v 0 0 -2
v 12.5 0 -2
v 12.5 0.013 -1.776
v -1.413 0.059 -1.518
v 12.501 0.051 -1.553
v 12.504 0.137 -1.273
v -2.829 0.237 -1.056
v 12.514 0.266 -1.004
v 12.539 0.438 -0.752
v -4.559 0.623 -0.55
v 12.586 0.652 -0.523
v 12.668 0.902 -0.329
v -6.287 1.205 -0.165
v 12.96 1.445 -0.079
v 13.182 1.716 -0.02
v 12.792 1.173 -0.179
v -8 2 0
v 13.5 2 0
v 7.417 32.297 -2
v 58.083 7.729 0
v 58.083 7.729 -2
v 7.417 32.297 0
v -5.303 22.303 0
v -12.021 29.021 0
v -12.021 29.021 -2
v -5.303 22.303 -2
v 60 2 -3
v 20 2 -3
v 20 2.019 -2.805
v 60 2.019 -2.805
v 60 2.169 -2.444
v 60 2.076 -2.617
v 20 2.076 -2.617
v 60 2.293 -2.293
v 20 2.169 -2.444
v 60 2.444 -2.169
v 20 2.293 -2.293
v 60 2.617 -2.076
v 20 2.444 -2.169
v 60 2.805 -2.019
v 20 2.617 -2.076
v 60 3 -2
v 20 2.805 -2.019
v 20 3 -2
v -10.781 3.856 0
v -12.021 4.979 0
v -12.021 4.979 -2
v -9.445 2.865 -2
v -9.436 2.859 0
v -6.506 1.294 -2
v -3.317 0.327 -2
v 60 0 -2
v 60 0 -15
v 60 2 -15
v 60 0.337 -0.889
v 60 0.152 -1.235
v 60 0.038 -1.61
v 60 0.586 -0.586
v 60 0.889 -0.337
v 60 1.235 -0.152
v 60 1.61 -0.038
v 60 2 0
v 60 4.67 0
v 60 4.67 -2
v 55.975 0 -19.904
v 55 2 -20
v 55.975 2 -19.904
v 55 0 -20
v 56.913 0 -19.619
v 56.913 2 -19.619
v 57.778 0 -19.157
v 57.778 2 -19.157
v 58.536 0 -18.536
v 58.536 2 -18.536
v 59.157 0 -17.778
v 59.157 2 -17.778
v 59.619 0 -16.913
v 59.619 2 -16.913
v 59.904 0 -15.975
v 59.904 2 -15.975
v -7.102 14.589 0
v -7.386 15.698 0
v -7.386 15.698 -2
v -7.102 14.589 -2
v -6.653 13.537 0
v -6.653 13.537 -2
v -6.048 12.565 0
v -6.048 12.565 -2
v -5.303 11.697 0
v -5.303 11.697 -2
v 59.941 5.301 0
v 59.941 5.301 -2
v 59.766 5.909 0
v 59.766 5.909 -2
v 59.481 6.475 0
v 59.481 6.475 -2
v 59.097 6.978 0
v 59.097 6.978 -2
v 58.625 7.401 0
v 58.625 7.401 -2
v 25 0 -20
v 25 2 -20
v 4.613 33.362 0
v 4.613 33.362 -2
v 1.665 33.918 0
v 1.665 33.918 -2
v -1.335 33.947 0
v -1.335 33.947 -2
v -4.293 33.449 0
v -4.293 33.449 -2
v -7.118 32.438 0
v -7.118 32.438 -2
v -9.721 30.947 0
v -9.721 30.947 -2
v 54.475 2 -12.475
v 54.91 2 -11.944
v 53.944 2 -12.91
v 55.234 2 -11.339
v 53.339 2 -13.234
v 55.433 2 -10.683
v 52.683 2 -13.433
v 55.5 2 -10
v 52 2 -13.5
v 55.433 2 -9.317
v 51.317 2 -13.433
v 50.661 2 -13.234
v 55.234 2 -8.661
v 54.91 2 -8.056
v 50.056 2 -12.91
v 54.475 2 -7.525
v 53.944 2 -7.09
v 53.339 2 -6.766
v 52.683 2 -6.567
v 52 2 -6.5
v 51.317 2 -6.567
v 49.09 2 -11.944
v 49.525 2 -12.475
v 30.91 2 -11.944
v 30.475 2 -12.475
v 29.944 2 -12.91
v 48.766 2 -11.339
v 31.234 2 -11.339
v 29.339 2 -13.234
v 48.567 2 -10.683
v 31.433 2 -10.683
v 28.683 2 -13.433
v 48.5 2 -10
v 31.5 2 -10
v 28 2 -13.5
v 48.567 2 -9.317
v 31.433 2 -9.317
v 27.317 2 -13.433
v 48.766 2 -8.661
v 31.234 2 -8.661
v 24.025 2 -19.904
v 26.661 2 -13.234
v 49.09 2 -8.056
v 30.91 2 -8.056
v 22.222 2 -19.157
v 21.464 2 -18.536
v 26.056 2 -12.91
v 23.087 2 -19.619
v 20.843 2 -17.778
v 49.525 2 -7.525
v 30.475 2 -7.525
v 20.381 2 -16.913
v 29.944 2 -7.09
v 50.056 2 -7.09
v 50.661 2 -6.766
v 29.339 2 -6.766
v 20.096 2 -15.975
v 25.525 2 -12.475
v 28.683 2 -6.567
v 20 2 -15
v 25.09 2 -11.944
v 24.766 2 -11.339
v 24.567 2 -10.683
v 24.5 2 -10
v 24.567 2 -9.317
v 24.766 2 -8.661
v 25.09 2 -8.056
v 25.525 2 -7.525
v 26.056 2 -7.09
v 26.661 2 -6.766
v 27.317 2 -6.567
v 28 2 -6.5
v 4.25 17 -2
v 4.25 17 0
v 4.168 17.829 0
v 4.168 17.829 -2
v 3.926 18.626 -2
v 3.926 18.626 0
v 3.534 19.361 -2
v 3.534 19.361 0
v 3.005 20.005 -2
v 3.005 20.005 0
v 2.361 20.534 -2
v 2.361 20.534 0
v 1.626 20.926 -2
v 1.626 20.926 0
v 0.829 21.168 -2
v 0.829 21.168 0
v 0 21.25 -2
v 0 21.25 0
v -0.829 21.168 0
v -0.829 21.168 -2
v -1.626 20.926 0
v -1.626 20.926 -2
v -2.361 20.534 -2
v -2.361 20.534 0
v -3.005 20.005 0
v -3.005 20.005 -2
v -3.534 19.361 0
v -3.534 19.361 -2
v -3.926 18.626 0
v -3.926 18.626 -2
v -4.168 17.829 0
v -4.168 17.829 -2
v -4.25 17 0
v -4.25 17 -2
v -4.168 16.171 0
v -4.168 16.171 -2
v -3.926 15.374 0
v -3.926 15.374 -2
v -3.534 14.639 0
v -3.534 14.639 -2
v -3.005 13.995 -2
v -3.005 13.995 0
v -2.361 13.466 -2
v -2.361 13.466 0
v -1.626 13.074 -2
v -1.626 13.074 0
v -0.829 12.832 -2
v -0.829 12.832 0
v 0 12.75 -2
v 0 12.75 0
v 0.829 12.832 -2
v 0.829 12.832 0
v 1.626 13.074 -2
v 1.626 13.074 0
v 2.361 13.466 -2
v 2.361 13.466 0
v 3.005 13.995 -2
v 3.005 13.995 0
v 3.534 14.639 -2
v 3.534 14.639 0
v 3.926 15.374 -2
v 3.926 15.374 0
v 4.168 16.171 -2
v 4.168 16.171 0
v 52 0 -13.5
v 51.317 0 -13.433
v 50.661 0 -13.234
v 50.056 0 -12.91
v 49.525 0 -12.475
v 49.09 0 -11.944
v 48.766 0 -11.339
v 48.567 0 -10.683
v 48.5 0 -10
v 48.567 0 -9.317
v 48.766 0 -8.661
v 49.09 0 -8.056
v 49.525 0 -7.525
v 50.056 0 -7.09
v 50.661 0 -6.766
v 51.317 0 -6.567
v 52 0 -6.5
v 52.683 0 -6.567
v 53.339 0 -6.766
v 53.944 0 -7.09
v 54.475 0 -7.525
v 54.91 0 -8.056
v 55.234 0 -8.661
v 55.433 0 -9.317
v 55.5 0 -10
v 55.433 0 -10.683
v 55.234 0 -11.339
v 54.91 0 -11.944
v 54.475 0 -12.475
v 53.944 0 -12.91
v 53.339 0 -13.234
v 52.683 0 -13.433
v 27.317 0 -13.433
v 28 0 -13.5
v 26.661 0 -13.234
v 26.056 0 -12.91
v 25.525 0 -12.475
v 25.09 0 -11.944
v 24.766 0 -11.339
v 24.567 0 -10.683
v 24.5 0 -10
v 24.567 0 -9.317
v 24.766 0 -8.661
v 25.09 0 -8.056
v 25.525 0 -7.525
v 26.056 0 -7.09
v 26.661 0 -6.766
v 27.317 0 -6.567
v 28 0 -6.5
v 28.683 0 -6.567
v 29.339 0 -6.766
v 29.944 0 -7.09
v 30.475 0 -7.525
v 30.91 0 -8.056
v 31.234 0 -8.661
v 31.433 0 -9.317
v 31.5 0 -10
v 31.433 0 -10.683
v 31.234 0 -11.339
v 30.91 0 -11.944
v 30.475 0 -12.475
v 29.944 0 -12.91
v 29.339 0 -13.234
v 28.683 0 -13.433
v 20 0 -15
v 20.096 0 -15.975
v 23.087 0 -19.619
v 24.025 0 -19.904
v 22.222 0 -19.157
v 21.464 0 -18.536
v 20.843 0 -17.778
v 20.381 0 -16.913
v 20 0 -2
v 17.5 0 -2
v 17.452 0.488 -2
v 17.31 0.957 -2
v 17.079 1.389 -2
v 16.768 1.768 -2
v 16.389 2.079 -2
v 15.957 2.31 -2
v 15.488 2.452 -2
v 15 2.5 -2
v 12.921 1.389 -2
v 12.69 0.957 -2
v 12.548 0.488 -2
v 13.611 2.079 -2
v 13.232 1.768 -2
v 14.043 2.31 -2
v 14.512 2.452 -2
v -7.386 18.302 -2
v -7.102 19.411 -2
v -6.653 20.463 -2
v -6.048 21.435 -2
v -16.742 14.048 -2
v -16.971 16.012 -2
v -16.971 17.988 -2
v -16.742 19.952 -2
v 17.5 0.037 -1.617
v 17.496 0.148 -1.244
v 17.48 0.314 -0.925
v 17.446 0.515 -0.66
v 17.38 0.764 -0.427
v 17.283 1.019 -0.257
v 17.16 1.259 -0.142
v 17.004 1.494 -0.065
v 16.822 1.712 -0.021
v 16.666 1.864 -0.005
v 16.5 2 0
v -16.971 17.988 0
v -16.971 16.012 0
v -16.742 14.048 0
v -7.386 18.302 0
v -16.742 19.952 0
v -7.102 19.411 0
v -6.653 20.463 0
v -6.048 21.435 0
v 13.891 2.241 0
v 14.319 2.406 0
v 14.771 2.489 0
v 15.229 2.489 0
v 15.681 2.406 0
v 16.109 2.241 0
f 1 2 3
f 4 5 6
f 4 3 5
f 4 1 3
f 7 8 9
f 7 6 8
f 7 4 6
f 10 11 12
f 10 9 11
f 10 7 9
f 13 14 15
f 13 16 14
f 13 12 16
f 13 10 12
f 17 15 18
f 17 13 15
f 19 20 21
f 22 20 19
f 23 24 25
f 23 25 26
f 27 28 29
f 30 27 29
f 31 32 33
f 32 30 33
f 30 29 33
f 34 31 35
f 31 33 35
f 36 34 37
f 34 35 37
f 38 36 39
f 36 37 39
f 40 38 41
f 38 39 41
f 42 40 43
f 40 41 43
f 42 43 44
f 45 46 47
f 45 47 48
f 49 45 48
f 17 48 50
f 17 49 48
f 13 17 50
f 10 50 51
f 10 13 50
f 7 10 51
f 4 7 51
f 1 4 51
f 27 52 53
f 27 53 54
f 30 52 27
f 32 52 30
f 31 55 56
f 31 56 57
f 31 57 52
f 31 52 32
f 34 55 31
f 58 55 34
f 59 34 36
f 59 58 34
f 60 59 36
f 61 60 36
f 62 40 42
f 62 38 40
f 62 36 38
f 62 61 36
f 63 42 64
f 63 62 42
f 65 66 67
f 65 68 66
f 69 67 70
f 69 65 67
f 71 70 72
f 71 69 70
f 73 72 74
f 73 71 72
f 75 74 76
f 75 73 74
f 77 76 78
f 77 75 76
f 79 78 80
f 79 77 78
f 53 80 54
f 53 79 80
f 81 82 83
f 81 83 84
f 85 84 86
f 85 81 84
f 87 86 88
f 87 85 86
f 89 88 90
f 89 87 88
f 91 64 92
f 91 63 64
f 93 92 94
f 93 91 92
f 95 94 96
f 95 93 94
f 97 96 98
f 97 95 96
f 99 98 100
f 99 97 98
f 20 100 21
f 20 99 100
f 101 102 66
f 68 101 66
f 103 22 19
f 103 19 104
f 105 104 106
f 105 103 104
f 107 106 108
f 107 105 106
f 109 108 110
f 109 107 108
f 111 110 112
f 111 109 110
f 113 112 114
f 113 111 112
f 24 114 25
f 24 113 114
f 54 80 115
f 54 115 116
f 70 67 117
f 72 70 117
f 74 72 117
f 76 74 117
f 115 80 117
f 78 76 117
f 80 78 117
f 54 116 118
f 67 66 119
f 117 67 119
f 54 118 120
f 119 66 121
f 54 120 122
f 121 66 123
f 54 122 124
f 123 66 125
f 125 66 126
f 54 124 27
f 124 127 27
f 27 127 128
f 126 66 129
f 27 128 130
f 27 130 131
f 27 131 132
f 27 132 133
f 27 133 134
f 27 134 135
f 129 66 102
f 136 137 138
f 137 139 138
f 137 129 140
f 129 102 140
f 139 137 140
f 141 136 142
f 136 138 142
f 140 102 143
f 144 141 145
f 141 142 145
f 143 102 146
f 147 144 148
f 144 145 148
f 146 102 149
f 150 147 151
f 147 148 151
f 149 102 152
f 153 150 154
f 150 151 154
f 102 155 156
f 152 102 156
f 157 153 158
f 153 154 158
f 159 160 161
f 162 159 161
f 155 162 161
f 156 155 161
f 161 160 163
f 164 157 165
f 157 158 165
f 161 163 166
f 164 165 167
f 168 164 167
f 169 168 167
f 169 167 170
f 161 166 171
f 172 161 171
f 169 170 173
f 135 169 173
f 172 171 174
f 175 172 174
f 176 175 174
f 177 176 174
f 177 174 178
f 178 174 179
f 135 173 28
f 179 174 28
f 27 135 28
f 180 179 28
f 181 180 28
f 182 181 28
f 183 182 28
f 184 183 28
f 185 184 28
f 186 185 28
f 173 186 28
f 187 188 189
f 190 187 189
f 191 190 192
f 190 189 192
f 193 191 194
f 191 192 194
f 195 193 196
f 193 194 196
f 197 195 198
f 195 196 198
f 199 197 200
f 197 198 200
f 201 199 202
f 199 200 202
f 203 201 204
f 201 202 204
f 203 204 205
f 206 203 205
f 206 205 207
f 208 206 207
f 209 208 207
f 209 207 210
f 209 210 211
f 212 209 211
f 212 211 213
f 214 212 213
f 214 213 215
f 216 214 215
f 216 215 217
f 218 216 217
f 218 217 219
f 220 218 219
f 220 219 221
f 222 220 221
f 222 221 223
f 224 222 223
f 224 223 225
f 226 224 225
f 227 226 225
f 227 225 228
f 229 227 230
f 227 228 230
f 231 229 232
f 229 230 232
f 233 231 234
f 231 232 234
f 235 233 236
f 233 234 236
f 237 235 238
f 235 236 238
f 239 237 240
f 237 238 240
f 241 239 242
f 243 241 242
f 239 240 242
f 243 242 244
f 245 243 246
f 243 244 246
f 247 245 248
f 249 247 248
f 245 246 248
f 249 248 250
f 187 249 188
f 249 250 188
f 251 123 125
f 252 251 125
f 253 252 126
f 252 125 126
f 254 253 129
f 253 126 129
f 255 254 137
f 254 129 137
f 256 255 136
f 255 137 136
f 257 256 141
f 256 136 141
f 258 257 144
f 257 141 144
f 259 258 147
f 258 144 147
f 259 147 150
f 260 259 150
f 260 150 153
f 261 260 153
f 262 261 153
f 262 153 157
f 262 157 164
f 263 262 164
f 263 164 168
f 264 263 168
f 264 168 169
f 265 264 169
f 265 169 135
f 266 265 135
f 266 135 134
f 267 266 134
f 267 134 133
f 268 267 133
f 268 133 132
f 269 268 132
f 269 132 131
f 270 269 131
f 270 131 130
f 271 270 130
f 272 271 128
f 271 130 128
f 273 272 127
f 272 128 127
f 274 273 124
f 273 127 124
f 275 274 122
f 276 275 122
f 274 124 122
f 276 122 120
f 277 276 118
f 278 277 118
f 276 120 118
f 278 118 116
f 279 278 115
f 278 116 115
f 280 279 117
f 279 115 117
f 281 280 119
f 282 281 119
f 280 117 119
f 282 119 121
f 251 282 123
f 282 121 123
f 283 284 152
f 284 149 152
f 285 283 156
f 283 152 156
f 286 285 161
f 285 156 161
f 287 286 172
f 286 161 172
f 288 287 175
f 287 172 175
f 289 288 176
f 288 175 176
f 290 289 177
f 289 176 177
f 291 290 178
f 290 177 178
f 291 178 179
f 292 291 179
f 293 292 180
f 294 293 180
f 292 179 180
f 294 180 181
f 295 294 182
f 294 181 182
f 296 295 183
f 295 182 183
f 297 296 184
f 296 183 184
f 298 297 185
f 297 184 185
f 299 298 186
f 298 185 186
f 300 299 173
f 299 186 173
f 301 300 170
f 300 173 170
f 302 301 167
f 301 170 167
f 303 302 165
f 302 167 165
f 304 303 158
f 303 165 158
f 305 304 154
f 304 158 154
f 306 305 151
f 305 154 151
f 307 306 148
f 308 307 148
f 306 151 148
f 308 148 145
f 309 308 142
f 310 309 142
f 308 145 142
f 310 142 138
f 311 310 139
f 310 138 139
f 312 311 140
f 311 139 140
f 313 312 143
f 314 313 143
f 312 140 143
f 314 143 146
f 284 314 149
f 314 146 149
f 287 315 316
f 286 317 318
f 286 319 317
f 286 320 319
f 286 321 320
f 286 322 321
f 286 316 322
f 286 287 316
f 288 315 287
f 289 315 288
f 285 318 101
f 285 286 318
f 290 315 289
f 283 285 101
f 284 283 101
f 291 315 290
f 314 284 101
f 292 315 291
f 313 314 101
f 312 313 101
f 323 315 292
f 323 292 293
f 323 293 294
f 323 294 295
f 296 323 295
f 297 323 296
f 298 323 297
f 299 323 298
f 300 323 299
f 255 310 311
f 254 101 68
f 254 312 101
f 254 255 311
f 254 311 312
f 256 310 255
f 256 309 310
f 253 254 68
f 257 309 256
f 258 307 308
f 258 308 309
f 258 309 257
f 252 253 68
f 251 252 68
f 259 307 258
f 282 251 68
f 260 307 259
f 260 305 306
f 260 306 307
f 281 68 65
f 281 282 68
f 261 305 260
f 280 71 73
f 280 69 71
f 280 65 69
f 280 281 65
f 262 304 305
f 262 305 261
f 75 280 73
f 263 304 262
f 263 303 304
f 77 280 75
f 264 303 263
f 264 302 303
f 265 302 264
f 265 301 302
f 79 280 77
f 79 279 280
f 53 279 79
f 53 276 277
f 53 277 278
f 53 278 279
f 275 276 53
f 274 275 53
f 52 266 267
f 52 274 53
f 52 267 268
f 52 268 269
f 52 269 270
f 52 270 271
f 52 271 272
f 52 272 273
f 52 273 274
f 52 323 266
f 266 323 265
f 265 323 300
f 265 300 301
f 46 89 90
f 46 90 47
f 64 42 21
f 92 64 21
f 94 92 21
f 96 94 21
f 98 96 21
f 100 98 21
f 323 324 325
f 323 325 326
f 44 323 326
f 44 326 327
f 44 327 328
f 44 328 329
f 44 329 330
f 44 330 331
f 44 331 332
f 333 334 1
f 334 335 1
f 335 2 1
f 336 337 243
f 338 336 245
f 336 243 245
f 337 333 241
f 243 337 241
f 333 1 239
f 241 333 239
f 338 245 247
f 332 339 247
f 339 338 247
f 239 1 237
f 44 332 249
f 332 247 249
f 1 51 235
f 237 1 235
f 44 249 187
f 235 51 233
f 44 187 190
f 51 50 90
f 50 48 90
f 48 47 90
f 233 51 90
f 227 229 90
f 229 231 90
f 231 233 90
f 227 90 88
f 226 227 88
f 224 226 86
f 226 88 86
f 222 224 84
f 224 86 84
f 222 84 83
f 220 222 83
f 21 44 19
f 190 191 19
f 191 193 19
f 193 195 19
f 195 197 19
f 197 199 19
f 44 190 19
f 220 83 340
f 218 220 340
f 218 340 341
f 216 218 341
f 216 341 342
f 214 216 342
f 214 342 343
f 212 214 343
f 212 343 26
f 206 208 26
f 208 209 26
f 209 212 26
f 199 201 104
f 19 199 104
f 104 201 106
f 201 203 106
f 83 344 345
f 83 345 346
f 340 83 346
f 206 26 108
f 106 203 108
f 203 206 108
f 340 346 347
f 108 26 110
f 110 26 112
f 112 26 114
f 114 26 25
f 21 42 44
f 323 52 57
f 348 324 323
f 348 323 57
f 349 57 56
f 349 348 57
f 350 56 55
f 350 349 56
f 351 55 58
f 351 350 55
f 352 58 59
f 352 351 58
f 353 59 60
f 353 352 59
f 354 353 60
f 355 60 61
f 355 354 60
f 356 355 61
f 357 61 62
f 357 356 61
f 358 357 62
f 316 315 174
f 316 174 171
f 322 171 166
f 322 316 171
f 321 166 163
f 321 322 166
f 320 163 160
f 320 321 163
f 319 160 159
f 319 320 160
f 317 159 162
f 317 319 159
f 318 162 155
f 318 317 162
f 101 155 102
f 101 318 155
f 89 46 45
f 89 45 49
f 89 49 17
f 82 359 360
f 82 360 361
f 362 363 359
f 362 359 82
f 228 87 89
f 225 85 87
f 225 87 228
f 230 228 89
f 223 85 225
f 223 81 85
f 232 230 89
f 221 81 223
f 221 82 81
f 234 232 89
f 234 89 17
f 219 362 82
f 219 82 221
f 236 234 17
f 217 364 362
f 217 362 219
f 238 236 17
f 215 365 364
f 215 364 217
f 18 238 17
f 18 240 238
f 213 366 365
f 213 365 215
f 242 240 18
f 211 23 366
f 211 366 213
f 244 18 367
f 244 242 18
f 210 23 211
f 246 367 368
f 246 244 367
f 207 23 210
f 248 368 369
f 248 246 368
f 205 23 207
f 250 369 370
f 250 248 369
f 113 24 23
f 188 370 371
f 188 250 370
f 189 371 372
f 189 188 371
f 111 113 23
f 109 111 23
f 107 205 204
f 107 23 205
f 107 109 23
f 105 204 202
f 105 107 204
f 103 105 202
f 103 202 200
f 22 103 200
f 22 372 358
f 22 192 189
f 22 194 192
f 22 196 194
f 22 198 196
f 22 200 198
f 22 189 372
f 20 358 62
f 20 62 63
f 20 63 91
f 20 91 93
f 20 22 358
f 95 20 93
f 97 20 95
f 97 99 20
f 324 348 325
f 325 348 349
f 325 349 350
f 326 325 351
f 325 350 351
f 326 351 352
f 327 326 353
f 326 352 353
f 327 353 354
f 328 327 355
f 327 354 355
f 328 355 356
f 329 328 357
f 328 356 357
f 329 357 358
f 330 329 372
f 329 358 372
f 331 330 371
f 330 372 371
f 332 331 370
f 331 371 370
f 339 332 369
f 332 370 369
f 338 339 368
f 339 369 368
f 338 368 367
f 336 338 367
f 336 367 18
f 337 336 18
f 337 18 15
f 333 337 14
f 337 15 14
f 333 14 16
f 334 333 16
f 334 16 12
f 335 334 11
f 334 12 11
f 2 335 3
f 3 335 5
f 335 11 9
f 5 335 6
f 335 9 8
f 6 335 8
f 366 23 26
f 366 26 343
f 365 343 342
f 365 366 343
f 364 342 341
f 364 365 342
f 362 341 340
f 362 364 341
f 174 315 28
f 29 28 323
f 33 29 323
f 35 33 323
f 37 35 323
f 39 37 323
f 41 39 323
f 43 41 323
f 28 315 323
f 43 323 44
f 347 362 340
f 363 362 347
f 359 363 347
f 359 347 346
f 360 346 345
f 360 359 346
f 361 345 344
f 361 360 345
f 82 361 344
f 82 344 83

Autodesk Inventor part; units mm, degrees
sketch "Sketch_1" plane through (0, 0, 0) normal (0, 0, 1) x (1, 0, 0)
  arc A0 (-16.7417, 19.952) -> (-16.7417, 14.048) centre (0, 17) ccw
  line L0 (-16.7417, 14.048) -> (-7.3861, 15.6976)
  arc A1 (-7.3861, 15.6976) -> (-5.3033, 11.6967) centre (0, 17) ccw
  line L1 (-5.3033, 11.6967) -> (-12.0208, 4.9792)
  arc A2 (-12.0208, 4.9792) -> (0, 0) centre (0, 17) ccw
  line L2 (0, 0) -> (60, 0)
  line L3 (60, 0) -> (60, 4.67)
  arc A3 (60, 4.67) -> (58.0834, 7.7293) centre (56.6, 4.67) ccw
  line L4 (58.0834, 7.7293) -> (7.4171, 32.2966)
  arc A4 (7.4171, 32.2966) -> (-12.0208, 29.0208) centre (0, 17) ccw
  line L5 (-12.0208, 29.0208) -> (-5.3033, 22.3033)
  arc A5 (-5.3033, 22.3033) -> (-7.3861, 18.3024) centre (0, 17) ccw
  line L6 (-7.3861, 18.3024) -> (-16.7417, 19.952)
  circle A6 centre (0, 17) radius 4.25
extrude "Extrusion1" add sketch "Sketch_1" against normal blind 20
sketch "Sketch_2" plane through (0, 0, 0) normal (1, 0, 0) x (0, 1, 0)
  line L0 (39, 5) -> (-5, 5)
  line L1 (-5, 5) -> (-5, -25)
  line L2 (-5, -25) -> (39, -25)
  line L3 (39, -25) -> (39, 5)
  arc A0 (2, 0) -> (0, -2) centre (2, -2) ccw
  line L4 (0, -2) -> (0, -20)
  line L5 (0, -20) -> (2, -20)
  line L6 (2, -20) -> (2, -3)
  arc A1 (3, -2) -> (2, -3) centre (3, -3) ccw
  line L7 (3, -2) -> (34, -2)
  line L8 (34, -2) -> (34, 0)
  line L9 (34, 0) -> (2, 0)
extrude "Extrusion2" cut sketch "Sketch_2" along normal mid plane 120
sketch "Sketch_3" plane through (0, 0, 0) normal (0, 1, 0) x (-1, 0, 0)
  line L0 (22, -25) -> (22, 5)
  line L1 (22, 5) -> (-65, 5)
  line L2 (-65, 5) -> (-65, -25)
  line L3 (-65, -25) -> (22, -25)
  line L4 (17, -2) -> (17, 0)
  line L5 (17, 0) -> (-60, 0)
  line L6 (-60, 0) -> (-60, -15)
  arc A0 (-60, -15) -> (-55, -20) centre (-55, -15) ccw
  line L7 (-55, -20) -> (-25, -20)
  arc A1 (-25, -20) -> (-20, -15) centre (-25, -15) ccw
  line L8 (-20, -15) -> (-20, -2)
  line L9 (-20, -2) -> (17, -2)
extrude "Extrusion3" cut sketch "Sketch_3" along normal blind 34
sketch "Sketch4" plane through (20, 0, -2) normal (0, -1, 0) x (1, 0, 0)
  point P0 (8, -8)
hole "Hole1" at (28, 0, -10) direction (0, 1, 0) diameter 7 depth 2
sketch "Sketch5" plane through (20, 0, -2) normal (0, -1, 0) x (1, 0, 0)
  point P0 (32, -8)
hole "Hole2" at (52, 0, -10) direction (0, 1, 0) diameter 7 depth 2
sketch "Sketch_7" plane through (0, 0, 0) normal (0, 0, 1) x (1, 0, 0)
  circle A0 centre (15, 0) radius 2.5
extrude "Extrusion4" cut sketch "Sketch_7" against normal blind 20
ref_plane "fix_end_l_XY" through (0, 17, 0) normal (0, 0, 1) x (1, 0, 0)
ref_plane "fix_end_l_YZ" through (0, 17, 0) normal (1, 0, 0) x (0, 1, 0)
ref_plane "fix_end_l_ZX" through (0, 17, 0) normal (0, 1, 0) x (0, 0, 1)
ref_plane "free_end_l_XY" through (0, 17, -2) normal (0, 0, 1) x (1, 0, 0)
ref_plane "free_end_l_YZ" through (0, 17, -2) normal (1, 0, 0) x (0, 1, 0)
ref_plane "free_end_l_ZX" through (0, 17, -2) normal (0, 1, 0) x (0, 0, 1)
ref_plane "l_to_r_XY" through (0, 17, -26) normal (0, 0, 1) x (1, 0, 0)
ref_plane "l_to_r_YZ" through (0, 17, -26) normal (1, 0, 0) x (0, 1, 0)
ref_plane "l_to_r_ZX" through (0, 17, -26) normal (0, 1, 0) x (0, 0, 1)
ref_plane "to_clip1_XY" through (0, 17, -10) normal (1, 0, 0) x (0, 0, -1)
ref_plane "to_clip1_YZ" through (0, 17, -10) normal (0, 0, -1) x (0, 1, 0)
ref_plane "to_clip1_ZX" through (0, 17, -10) normal (0, 1, 0) x (1, 0, 0)
properties part number "MHPUS306-Ab_fixed_left"
